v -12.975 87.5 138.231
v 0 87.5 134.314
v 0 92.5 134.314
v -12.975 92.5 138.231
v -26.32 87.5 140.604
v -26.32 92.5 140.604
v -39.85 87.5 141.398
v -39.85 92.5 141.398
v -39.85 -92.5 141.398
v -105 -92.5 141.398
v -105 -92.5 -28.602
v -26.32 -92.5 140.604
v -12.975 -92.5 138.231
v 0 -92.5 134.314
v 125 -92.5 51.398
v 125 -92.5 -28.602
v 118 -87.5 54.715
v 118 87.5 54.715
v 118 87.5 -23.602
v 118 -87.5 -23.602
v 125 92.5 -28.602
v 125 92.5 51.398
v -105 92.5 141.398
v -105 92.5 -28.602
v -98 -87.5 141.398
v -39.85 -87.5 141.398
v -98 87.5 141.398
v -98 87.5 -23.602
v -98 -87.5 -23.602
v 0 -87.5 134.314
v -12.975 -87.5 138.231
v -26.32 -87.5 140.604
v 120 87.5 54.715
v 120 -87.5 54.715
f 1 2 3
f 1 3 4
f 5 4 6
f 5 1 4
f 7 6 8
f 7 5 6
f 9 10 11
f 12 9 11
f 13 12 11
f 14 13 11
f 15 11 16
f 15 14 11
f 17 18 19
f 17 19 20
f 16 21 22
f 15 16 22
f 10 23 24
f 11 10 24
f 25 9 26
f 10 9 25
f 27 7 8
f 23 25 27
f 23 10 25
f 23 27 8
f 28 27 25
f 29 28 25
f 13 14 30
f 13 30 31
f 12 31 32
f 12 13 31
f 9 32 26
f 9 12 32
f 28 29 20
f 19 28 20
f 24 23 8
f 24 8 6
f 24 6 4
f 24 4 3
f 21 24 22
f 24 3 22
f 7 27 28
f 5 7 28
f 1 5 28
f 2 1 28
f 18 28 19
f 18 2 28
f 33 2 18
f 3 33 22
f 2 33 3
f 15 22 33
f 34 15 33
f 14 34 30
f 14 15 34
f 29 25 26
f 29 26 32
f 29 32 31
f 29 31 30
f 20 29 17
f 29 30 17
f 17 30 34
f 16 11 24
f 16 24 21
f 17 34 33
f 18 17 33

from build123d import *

# Parameters (mm, degrees)
F1_DEPTH = 92.5
F2_W     = 220
F2_H     = 175
F3_DEPTH = 200
F4_DEPTH = 195
F5_DEPTH = 2
F6_DEPTH = 2


with BuildPart() as f1:
    # F0 (on Front) → F1 (new body, symmetric)
    with BuildSketch(Plane.XZ):
        with BuildLine():
            Line((-39.8502688743, 141.3978409826), (-105.0004470674, 141.3978409826))
            Line((-105.0004470674, 141.3978409826), (-105.0004470674, -28.6021590174))
            Line((-105.0004470674, -28.6021590174), (124.9995529326, -28.6021590174))
            Line((124.9995529326, -28.6021590174), (124.9995529326, 51.3978409826))
            Line((124.9995529326, 51.3978409826), (0, 134.314134717))
            ThreePointArc((0, 134.314134717), (-19.6127861763, 139.6131417621), (-39.8502688743, 141.3978409826))
        make_face()
    extrude(amount=F1_DEPTH, both=True)

    # F2 (on face) → F3 (join)
    with BuildSketch(Plane(origin=(0, 0, -28.6021590174), x_dir=(1, 0, 0), z_dir=(0, 0, -1))):
        with Locations((9.9995529326, 0)):
            Rectangle(F2_W, F2_H)
    extrude(amount=-F3_DEPTH)

    # F4 (cut): a face of the model
    f4_faces = [f1.faces().sort_by_distance(p)[0] for p in [
        (9.9995529326, 0, 171.3978409826),
    ]]
    extrude(f4_faces, amount=-F4_DEPTH, mode=Mode.SUBTRACT)

    # F5 (add): a face of the model
    f5_faces = [f1.faces().sort_by_distance(p)[0] for p in [
        (-100.0004470674, 0, 58.8978409826),
    ]]
    extrude(f5_faces, amount=F5_DEPTH)

    # F6 (add): a face of the model
    f6_faces = [f1.faces().sort_by_distance(p)[0] for p in [
        (119.9995529326, 0, 15.5561727884),
    ]]
    extrude(f6_faces, amount=F6_DEPTH)


solid = f1.part
